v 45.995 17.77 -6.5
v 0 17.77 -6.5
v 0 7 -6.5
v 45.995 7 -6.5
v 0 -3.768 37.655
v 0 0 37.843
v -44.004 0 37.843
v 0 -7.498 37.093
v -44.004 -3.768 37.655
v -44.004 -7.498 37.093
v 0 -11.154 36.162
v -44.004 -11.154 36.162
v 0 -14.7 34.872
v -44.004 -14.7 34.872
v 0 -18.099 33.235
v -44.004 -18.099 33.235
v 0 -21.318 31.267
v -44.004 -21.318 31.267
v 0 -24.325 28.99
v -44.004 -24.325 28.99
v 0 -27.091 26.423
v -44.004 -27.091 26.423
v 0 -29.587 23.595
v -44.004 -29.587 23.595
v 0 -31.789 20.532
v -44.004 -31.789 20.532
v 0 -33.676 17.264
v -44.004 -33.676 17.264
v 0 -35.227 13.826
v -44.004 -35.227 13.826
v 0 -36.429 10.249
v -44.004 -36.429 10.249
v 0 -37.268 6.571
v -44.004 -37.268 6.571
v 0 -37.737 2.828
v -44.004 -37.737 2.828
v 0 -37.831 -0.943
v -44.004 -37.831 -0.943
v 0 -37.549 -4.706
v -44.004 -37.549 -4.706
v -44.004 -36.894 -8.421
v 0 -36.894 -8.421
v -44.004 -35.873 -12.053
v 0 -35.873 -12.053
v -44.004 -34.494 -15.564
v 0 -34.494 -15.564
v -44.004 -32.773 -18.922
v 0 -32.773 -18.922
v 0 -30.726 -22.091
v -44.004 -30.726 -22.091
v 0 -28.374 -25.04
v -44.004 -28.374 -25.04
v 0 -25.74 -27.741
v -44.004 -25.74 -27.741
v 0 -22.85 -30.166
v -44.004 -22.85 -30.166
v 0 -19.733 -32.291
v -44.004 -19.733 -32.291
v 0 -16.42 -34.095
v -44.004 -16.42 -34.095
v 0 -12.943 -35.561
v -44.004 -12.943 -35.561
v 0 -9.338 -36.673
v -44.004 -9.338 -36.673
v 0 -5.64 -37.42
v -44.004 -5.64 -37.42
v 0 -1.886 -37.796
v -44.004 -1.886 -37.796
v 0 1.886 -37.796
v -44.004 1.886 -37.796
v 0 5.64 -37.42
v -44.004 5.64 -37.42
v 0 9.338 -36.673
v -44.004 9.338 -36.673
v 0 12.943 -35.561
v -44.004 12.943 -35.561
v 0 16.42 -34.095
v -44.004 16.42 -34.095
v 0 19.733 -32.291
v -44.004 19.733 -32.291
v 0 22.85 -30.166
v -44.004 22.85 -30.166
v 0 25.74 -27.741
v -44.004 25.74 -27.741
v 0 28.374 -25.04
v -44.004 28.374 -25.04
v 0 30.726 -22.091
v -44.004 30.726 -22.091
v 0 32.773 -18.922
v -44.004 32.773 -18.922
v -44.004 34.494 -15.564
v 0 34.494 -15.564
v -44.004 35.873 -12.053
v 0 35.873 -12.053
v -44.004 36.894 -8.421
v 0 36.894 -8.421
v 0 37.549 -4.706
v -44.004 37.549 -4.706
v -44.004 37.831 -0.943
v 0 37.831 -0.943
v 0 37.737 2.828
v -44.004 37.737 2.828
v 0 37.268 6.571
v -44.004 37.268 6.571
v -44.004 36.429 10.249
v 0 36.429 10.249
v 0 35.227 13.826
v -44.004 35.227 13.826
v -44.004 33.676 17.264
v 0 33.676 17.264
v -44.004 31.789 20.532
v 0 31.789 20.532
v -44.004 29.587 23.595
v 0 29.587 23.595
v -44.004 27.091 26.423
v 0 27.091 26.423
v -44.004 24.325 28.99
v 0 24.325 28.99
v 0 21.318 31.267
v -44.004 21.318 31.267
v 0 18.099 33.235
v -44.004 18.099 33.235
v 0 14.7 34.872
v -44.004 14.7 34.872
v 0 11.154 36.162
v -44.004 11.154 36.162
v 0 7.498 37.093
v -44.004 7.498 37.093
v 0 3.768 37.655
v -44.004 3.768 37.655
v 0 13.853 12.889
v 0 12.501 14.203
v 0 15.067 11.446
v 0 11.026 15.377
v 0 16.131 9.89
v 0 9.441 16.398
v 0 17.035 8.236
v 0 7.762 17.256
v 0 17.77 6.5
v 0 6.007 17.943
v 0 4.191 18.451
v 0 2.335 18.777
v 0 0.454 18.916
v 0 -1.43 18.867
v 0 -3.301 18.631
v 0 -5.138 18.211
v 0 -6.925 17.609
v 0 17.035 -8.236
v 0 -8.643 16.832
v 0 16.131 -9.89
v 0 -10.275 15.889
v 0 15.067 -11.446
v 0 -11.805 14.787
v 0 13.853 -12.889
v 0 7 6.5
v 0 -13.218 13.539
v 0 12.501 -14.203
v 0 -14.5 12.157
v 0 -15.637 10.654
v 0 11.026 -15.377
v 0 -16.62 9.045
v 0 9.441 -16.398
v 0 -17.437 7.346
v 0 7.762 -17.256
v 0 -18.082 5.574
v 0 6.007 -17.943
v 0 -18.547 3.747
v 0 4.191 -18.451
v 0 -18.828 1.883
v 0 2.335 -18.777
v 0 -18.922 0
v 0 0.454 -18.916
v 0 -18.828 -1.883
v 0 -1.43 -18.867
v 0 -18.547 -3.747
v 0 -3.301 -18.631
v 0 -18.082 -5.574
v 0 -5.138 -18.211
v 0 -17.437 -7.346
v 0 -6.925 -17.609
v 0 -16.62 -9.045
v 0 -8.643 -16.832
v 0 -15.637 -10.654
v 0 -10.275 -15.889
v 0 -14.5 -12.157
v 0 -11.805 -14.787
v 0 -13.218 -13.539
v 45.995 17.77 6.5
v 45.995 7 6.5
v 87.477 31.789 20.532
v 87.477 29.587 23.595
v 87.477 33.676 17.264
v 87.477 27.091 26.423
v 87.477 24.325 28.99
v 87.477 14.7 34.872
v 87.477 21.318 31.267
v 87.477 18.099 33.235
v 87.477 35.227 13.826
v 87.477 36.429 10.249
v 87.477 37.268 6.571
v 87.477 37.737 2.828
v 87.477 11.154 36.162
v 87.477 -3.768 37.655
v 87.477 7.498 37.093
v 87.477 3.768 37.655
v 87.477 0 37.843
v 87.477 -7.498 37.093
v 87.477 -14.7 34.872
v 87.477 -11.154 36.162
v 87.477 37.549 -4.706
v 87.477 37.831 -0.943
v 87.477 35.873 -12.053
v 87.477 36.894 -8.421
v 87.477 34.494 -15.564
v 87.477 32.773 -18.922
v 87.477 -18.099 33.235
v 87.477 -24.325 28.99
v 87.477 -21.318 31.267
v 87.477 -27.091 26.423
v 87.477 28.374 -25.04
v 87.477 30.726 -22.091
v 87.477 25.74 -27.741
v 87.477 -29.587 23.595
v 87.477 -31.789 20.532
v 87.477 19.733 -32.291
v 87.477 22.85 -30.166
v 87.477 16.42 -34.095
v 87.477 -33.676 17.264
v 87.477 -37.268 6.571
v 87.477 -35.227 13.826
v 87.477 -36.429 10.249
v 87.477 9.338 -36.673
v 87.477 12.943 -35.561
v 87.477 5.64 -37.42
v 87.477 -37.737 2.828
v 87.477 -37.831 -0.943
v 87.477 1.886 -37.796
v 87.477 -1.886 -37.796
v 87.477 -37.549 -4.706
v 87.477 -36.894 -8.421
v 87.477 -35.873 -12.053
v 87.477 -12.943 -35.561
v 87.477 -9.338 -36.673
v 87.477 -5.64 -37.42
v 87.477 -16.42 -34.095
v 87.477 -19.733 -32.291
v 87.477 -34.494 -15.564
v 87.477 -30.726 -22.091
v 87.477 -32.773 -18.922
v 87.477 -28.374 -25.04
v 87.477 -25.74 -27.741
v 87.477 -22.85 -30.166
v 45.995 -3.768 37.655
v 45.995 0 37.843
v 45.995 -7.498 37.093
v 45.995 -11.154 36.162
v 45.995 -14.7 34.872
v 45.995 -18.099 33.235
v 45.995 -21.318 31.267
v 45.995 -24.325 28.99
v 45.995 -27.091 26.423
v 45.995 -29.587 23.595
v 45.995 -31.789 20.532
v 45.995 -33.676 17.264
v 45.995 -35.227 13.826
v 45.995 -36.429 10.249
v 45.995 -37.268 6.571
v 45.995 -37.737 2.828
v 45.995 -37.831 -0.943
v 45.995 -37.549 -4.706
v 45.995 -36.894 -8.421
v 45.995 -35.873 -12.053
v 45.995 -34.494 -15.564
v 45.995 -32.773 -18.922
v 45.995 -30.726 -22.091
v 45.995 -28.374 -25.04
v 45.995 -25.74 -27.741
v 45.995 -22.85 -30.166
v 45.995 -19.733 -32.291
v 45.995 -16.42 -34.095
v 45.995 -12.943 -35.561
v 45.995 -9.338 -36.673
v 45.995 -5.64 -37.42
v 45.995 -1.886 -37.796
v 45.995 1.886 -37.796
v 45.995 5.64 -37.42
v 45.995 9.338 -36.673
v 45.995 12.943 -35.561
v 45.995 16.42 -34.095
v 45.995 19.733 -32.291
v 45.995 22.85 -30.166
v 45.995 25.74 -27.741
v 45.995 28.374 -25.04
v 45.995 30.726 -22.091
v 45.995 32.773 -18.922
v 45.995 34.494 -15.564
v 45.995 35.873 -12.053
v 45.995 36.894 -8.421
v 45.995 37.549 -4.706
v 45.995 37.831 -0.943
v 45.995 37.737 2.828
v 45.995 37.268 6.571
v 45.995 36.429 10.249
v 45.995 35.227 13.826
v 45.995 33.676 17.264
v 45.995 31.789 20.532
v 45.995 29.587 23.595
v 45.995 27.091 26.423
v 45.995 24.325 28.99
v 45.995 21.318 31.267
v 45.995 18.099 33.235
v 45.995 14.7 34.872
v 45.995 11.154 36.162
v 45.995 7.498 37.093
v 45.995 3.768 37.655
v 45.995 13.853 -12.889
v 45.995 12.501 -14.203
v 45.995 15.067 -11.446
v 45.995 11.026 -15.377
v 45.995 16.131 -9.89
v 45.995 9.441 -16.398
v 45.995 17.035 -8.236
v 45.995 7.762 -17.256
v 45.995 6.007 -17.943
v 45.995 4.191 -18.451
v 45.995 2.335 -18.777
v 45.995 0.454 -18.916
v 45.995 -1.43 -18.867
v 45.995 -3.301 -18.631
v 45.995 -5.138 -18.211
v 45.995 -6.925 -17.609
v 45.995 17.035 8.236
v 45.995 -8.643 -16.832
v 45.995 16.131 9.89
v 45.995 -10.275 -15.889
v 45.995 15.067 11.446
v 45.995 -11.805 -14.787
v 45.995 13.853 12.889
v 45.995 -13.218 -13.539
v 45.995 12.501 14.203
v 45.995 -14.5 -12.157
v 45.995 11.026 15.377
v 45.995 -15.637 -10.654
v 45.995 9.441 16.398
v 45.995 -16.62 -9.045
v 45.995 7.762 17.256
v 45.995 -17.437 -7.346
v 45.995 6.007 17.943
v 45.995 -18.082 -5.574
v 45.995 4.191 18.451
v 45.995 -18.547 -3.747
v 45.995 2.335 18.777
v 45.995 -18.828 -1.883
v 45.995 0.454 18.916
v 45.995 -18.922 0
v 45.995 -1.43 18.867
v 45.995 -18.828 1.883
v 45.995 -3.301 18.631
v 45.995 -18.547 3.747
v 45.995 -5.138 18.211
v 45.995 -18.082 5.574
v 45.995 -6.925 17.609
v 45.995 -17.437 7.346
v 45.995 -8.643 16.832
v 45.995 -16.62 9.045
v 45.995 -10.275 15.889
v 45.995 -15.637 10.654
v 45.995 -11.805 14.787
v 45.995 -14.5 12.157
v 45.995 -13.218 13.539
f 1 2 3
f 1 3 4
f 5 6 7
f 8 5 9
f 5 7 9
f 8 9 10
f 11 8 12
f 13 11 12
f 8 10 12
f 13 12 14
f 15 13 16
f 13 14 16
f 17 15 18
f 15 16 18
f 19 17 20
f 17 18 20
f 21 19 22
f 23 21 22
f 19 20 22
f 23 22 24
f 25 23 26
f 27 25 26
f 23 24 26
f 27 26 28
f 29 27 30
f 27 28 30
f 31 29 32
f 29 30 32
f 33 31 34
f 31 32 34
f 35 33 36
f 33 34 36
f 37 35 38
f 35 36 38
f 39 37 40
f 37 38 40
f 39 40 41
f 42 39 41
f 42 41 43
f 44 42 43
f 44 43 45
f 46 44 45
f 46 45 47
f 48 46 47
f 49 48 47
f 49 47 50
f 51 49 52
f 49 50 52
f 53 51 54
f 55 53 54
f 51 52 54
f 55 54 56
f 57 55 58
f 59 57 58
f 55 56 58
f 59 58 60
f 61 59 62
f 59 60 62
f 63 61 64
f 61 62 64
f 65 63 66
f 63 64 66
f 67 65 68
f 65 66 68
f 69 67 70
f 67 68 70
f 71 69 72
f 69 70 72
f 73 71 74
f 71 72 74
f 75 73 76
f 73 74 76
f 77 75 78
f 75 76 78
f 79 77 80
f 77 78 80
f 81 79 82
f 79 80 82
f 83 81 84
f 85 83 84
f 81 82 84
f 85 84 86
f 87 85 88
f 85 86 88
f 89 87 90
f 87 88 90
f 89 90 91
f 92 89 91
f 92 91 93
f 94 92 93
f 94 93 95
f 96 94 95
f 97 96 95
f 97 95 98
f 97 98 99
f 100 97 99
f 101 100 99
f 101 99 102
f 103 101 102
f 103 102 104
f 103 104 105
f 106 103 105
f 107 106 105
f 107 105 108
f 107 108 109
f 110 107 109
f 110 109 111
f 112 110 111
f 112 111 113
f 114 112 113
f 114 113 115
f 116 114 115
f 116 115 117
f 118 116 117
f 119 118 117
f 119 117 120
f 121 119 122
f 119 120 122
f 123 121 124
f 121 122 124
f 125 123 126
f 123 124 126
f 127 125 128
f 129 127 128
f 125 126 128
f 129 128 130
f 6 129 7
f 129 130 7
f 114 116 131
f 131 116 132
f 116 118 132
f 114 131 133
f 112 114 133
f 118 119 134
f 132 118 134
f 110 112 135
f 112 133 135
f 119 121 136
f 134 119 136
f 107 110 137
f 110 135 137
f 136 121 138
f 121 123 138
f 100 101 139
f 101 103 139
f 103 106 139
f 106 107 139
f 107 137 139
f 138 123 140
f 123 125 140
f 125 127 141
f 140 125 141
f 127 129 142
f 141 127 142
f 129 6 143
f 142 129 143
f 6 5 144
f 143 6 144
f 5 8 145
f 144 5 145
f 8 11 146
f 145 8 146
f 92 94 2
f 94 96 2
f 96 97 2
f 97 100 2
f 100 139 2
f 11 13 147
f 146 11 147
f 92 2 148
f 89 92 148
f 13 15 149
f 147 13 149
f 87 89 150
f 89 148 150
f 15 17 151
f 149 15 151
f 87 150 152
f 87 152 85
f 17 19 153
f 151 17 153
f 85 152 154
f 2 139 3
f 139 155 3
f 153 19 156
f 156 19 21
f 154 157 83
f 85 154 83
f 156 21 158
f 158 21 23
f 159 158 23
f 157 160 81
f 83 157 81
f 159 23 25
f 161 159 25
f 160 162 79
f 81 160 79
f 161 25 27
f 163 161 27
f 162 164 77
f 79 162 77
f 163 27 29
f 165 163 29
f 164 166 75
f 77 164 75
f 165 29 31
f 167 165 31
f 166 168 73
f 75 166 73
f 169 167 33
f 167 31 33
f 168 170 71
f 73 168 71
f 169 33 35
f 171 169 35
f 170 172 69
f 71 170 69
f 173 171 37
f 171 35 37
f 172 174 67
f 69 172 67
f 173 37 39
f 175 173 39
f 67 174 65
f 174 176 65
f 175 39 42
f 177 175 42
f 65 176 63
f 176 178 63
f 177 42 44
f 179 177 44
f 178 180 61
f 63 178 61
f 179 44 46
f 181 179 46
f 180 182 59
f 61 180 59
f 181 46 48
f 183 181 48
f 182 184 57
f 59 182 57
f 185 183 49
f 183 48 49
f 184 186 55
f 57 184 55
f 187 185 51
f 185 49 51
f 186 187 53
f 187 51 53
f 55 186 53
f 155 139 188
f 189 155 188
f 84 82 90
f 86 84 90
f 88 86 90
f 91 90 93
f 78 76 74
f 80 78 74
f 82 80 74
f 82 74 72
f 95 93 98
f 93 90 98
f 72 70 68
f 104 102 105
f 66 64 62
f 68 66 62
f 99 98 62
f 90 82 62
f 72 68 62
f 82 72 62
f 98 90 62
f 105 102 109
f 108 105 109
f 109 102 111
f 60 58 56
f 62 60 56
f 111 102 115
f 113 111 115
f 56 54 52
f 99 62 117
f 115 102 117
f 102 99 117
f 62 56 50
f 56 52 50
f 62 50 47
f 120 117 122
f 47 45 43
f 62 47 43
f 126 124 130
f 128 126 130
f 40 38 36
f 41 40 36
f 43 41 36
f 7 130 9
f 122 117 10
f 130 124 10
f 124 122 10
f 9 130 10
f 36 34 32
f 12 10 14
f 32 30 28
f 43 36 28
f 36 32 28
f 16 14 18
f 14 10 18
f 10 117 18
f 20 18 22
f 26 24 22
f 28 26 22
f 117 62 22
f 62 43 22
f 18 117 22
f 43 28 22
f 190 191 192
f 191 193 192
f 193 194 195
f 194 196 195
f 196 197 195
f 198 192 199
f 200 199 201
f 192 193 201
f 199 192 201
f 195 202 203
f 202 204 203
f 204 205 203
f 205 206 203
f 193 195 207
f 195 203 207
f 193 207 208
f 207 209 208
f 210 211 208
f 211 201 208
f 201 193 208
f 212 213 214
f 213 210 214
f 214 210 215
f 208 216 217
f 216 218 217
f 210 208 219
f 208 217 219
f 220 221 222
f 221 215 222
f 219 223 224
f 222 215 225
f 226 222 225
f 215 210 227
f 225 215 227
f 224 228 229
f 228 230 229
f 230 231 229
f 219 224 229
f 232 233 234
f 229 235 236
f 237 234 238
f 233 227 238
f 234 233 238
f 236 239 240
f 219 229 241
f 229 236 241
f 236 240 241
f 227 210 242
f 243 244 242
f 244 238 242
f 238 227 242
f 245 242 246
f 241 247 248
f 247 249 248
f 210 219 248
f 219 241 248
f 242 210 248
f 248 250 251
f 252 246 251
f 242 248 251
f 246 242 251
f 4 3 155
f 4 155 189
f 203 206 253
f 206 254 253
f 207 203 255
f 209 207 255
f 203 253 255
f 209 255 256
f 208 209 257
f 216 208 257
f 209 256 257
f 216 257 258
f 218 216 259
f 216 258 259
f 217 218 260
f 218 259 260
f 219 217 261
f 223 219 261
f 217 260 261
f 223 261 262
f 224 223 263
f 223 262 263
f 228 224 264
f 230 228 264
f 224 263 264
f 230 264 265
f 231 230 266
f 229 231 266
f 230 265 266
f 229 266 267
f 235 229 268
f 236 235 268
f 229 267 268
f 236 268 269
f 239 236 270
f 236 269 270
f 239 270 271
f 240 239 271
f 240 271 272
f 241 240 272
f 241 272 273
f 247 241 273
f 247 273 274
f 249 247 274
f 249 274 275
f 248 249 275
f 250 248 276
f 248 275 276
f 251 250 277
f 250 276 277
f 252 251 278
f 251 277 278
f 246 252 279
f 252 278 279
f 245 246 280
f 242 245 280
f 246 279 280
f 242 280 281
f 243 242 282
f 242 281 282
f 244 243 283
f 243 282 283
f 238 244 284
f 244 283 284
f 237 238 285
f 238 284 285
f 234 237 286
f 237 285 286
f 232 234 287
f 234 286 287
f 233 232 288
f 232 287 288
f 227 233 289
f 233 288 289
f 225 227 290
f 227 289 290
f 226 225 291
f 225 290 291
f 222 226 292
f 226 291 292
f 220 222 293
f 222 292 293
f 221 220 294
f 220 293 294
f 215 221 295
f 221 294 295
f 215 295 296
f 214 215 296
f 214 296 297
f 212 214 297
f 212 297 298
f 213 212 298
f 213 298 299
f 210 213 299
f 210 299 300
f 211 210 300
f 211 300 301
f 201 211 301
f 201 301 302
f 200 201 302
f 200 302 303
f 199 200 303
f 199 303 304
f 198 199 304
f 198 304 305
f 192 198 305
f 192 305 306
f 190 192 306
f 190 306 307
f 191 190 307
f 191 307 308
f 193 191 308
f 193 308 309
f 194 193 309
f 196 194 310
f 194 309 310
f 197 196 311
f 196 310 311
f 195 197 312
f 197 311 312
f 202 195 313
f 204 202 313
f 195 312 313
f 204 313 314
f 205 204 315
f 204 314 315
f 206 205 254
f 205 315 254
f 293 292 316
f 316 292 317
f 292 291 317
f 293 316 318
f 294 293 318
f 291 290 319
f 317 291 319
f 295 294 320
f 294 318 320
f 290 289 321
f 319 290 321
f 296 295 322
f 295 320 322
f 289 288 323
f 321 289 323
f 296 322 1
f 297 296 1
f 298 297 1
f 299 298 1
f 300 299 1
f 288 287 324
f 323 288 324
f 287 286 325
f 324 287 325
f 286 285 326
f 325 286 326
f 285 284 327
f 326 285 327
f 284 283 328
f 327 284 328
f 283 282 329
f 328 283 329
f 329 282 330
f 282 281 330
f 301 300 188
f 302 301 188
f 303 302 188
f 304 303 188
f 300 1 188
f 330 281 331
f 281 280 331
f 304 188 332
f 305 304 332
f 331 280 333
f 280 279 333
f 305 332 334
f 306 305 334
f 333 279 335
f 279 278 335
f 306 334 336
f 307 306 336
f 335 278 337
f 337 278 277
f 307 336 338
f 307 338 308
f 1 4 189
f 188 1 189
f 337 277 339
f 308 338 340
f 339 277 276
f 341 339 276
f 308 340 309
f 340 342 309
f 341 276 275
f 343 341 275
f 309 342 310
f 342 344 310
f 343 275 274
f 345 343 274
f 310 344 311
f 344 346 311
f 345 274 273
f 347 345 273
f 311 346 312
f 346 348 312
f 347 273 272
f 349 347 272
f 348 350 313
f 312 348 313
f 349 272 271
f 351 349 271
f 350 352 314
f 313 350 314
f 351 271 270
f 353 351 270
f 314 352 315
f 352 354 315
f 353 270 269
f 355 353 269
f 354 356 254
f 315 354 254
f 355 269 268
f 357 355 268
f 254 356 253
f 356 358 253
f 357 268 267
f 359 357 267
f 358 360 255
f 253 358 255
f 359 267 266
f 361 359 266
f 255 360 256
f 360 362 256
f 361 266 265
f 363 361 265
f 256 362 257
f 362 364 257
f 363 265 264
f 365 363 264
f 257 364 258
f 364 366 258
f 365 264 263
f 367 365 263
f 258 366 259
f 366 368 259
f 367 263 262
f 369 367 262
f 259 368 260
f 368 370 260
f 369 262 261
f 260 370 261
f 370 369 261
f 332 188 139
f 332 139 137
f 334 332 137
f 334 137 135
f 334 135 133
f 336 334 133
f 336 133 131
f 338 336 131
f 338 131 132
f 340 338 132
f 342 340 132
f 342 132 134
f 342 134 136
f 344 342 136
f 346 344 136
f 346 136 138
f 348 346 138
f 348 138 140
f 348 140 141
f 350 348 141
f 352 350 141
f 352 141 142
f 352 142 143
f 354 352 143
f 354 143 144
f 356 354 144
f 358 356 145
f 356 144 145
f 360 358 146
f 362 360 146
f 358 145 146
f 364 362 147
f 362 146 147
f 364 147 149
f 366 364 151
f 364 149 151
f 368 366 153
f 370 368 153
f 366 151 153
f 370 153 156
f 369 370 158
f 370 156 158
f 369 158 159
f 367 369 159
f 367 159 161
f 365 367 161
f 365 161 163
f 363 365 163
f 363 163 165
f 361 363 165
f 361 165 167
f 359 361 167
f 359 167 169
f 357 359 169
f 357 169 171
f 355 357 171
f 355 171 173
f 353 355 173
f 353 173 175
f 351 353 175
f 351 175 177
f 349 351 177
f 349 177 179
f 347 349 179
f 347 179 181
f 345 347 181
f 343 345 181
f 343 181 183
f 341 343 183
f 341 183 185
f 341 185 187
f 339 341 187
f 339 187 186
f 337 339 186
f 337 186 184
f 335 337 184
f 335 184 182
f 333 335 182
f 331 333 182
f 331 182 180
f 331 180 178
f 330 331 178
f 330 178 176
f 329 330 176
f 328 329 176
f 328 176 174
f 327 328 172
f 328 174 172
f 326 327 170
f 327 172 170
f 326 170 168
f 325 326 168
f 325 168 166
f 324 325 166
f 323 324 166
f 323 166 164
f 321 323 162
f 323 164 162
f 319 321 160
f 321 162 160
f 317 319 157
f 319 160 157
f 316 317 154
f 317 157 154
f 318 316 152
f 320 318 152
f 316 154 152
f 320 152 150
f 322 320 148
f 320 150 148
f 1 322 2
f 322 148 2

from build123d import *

# Parameters (mm, degrees)
ENL_V_START             = 20
ESQUISSE2_W             = 45.995149175
ESQUISSE2_H             = 13
ENL_V_MAT_EXTRU_1_DEPTH = 13


with BuildPart() as part:
    # Esquisse1 → Révolution1 (revolve)
    with BuildSketch(Plane.XY, mode=Mode.PRIVATE) as r_volution1_sk:
        Polygon((-44.003614869, 0), (87.477059288, 0), (87.477059288, 37.843146067), (45.995149175, 37.843146067), (45.995149175, 18.921573034), (0, 18.921573034), (0, 37.843146067), (-44.003614869, 37.843146067), align=None)
    revolve(r_volution1_sk.sketch.rotate(Axis((-44.003614869, 0, 0), (1, 0, 0)), 90), axis=Axis((-44.003614869, 0, 0), (1, 0, 0)))

    # Esquisse2 → Enlèv. mat.-Extru.1 (cut)
    with BuildSketch(Plane(origin=(0, 0, 0), x_dir=(1, 0, 0), z_dir=(0, 1, 0)).offset(ENL_V_START)):
        with Locations((22.997574588, 0)):
            Rectangle(ESQUISSE2_W, ESQUISSE2_H)
    extrude(amount=-ENL_V_MAT_EXTRU_1_DEPTH, mode=Mode.SUBTRACT)


solid = part.part
